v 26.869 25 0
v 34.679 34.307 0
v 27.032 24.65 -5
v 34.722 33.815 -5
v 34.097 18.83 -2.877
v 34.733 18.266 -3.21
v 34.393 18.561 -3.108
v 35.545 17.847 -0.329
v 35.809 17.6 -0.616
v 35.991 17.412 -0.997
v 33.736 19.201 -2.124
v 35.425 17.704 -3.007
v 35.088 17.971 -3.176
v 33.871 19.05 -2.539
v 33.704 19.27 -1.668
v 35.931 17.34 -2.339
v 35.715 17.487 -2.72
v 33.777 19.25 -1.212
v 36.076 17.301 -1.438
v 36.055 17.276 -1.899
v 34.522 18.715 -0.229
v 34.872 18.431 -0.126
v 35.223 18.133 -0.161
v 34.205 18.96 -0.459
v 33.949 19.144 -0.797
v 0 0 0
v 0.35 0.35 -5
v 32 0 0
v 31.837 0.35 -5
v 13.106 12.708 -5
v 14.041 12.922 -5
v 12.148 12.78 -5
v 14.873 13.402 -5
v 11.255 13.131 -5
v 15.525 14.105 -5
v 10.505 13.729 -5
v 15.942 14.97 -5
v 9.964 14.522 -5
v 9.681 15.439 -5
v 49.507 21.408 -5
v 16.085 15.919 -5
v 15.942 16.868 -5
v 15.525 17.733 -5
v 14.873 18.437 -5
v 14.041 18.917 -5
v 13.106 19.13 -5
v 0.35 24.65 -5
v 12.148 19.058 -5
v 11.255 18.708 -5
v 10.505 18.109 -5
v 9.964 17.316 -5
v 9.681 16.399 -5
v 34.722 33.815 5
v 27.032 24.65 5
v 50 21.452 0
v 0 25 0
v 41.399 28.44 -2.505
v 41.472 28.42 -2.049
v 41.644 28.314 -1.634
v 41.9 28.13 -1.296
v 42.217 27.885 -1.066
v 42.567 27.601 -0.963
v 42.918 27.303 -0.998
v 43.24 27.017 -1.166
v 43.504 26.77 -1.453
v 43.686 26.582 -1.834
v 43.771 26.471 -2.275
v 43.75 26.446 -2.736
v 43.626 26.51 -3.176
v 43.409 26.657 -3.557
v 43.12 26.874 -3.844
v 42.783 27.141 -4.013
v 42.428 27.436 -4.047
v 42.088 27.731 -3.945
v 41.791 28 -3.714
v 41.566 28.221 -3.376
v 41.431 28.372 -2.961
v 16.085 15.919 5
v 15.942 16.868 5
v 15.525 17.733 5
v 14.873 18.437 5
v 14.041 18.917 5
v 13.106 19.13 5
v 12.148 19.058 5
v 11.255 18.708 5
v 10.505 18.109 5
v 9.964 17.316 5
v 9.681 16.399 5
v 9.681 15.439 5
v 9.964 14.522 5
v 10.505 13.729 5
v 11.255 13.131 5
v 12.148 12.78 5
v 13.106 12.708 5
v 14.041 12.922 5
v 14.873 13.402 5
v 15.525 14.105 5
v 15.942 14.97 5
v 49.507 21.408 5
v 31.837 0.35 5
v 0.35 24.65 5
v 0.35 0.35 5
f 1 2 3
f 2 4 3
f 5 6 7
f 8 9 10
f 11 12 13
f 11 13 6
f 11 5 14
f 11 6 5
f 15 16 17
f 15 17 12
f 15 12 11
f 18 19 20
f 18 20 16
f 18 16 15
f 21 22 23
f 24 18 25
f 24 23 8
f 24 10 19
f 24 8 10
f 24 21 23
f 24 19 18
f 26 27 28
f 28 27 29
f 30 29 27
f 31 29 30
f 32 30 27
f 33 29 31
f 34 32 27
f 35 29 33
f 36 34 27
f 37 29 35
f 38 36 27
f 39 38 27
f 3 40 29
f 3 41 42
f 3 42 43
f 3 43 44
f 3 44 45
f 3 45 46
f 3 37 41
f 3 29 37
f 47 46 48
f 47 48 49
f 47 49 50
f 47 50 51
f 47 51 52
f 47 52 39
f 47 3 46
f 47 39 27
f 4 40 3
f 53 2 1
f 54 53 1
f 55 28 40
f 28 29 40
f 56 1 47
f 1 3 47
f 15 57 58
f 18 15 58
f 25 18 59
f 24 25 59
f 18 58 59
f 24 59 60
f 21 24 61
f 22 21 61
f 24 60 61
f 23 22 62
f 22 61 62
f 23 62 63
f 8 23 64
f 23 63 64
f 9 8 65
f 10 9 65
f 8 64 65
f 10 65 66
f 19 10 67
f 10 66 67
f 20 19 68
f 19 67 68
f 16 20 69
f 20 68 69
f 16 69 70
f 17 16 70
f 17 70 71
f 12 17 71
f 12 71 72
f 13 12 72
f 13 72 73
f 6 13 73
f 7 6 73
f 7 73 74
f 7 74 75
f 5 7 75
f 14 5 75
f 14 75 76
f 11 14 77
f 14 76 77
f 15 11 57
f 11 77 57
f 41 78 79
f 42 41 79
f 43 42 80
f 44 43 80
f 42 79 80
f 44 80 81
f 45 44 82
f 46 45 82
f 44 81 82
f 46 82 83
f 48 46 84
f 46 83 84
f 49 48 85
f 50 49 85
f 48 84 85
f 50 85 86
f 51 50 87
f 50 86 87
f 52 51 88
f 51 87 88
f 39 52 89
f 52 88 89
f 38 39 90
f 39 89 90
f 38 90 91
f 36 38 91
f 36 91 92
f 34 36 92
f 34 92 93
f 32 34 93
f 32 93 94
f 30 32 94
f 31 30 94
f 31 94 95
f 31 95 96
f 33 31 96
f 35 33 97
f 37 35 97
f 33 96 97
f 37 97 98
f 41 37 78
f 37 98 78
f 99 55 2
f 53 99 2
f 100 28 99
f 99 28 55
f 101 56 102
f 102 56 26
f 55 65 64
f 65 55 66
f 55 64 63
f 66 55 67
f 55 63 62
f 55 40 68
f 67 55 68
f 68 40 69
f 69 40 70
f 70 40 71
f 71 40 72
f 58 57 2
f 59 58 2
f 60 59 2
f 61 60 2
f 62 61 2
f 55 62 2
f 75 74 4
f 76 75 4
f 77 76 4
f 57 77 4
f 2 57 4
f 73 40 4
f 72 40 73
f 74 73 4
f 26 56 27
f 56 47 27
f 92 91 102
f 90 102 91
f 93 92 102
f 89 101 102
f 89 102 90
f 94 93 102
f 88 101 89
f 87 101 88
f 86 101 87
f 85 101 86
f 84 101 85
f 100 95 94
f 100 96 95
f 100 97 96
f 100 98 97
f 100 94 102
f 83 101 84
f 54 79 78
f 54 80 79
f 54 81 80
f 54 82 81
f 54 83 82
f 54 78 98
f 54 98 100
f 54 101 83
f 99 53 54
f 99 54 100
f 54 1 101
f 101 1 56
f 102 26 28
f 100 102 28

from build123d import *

# Parameters (mm, degrees)
BOSS_EXTRUDE1_DEPTH           = 5
BOSS_EXTRUDE1_DRAFT           = 4
BOSS_EXTRUDE1_OTHER_WAY_DEPTH = 5
BOSS_EXTRUDE1_OTHER_WAY_TAPER = 4
SKETCH7_R                     = 3.219945093
CUT_EXTRUDE1_DEPTH            = 10
SKETCH9_R                     = 1.550098449
CUT_EXTRUDE2_DEPTH            = 12


with BuildPart() as part:
    # Sketch4 → Boss-Extrude1 (with draft: the straight prism first)
    with BuildSketch(Plane.XY):
        Polygon((32, 0), (50, 21.451564667), (34.679111138, 34.30731686), (26.869344993, 25), (0, 25), (0, 0), align=None)
    extrude(amount=BOSS_EXTRUDE1_DEPTH)
    # Boss-Extrude1: the draft: its side faces are tilted about the plane it starts from
    boss_extrude1_sides = [part.faces().sort_by_distance(p)[0] for p in [
        (41, 10.725782333, 2.5),
        (42.339555569, 27.879440764, 2.5),
        (30.774228065, 29.65365843, 2.5),
        (13.434672496, 25, 2.5),
        (0, 12.5, 2.5),
        (16, 0, 2.5),
    ]]
    draft(boss_extrude1_sides, Plane.XY, BOSS_EXTRUDE1_DRAFT)

    # Sketch4 → Boss-Extrude1 other way (add)
    with BuildSketch(Plane.XY):
        Polygon((32, 0), (50, 21.451564667), (34.679111138, 34.30731686), (26.869344993, 25), (0, 25), (0, 0), align=None)
    extrude(amount=-BOSS_EXTRUDE1_OTHER_WAY_DEPTH, taper=BOSS_EXTRUDE1_OTHER_WAY_TAPER)

    # Sketch7 → Cut-Extrude1 (cut)
    with BuildSketch(Plane.XY.offset(5)):
        with Locations((12.864998104, 15.91914525)):
            Circle(SKETCH7_R)
    extrude(amount=-CUT_EXTRUDE1_DEPTH, mode=Mode.SUBTRACT)

    # Sketch9 → Cut-Extrude2 (cut)
    with BuildSketch(Plane(origin=(31.069705783, 37.027433488, -3.379974101), x_dir=(0.7673555816021824, -0.6385668755340675, 0.058290280962054304), z_dir=(0.6412218113757333, 0.7641783973568009, -0.06975647374412532))):
        with Locations(Location((15.007838912, 0, 0), (0, 0, 183.349850625))):
            Circle(SKETCH9_R)
    extrude(amount=-CUT_EXTRUDE2_DEPTH, mode=Mode.SUBTRACT)


solid = part.part
